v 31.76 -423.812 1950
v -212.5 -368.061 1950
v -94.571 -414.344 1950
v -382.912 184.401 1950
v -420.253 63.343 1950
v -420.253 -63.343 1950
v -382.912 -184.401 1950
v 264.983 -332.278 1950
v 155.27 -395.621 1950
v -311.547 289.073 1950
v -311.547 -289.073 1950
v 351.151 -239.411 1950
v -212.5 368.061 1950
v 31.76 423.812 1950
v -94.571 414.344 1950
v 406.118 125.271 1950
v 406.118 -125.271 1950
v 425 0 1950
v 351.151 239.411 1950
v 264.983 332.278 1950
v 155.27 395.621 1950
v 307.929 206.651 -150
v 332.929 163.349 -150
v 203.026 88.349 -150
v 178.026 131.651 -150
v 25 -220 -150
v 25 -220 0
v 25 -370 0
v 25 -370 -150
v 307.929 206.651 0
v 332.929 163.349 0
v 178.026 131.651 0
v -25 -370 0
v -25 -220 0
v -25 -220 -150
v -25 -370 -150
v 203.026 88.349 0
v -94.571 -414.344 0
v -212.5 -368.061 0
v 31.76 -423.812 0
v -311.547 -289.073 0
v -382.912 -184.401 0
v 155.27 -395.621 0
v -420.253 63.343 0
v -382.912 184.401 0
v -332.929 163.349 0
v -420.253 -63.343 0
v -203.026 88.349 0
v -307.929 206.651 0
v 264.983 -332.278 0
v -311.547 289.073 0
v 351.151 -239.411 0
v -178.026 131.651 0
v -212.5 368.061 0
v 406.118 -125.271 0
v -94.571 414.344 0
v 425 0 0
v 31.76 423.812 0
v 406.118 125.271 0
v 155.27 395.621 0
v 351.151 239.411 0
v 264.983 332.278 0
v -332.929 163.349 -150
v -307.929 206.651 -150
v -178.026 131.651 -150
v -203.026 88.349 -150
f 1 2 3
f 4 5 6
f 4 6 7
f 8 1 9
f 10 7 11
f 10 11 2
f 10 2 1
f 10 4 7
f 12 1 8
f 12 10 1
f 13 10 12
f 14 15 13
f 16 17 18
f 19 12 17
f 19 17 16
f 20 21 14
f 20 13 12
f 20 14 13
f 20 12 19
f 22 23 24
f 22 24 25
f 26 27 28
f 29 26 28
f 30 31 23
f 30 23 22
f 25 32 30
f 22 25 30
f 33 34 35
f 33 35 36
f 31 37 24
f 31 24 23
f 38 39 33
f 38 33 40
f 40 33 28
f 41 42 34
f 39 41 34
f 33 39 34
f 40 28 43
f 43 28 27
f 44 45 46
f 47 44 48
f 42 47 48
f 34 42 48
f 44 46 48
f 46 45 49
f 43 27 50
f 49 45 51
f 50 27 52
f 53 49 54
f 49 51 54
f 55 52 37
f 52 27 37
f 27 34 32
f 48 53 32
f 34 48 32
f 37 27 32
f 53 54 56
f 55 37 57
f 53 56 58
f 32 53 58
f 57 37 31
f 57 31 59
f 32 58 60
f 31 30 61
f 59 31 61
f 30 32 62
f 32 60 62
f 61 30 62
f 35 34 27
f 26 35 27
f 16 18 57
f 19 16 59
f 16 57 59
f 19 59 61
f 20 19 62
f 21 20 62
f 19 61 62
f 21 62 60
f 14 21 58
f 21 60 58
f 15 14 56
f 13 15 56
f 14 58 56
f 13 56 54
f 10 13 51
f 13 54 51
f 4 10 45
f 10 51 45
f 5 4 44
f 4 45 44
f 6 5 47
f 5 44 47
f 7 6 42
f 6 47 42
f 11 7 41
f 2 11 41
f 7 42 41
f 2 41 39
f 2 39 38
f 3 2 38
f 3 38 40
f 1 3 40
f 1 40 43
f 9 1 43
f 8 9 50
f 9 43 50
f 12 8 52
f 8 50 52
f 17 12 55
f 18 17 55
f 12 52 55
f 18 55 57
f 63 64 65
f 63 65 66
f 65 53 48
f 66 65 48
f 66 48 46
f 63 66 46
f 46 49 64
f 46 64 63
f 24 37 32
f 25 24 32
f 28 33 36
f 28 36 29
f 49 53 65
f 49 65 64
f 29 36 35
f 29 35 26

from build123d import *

# Parameters (mm, degrees)
F0_R            = 425
F1_DEPTH        = 1950
F2_W            = 50
F2_H            = 150
F3_DEPTH        = 150
F3_COPIES_COUNT = 3


# Not quite as in the source:
# - a pattern or mirror of a feature is missing from the dataset's text; its kind, count and spacing are read off the source's solid


with BuildPart() as f1:
    # F0 (on Top) → F1 (new body)
    with BuildSketch(Plane.XY):
        Circle(F0_R)
    extrude(amount=F1_DEPTH)

    # F2 (on face) → F3 (join)
    with BuildSketch(Plane(origin=(0, 0, 0), x_dir=(1, 0, 0), z_dir=(0, 0, -1))):
        with Locations((0, 295)):
            Rectangle(F2_W, F2_H)
    f3 = extrude(amount=F3_DEPTH)

    # F3_copies: F3 ×3 about axis
    f3_copies_axis = Axis((0, 0, 0), (0, 0, 1))
    for i in range(1, F3_COPIES_COUNT):
        add(f3.rotate(f3_copies_axis, i * 360 / F3_COPIES_COUNT))


solid = f1.part
